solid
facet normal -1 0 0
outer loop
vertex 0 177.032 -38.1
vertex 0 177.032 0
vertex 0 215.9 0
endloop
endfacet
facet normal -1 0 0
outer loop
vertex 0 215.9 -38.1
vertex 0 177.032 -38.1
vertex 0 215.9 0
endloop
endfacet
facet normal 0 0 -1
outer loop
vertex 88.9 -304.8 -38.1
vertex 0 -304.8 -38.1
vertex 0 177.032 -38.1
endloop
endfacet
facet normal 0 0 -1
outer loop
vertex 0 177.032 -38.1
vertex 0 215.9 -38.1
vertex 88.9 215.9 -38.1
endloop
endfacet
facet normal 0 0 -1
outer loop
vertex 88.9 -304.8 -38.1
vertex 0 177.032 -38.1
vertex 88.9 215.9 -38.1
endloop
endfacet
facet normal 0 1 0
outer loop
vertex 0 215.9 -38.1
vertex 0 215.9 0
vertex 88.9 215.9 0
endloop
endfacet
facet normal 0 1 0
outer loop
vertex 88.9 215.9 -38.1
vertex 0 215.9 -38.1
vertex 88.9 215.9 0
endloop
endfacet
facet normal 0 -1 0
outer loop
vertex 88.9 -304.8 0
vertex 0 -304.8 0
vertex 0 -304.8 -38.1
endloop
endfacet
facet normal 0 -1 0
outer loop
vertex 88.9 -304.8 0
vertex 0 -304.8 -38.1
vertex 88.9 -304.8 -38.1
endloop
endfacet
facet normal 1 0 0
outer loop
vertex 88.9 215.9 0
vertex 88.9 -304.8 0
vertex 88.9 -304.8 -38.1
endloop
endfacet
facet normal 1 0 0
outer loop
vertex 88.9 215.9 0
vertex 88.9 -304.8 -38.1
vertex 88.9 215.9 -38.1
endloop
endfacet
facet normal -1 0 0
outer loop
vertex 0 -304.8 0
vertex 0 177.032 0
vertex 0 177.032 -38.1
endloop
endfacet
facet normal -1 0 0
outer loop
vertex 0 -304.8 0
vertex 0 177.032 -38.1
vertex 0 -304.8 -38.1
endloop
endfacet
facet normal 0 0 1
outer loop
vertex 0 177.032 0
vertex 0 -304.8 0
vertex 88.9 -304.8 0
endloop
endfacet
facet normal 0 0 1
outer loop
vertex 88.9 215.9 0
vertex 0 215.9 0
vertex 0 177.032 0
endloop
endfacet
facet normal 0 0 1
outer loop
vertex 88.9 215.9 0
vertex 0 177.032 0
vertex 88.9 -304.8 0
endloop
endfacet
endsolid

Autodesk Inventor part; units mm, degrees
ref_plane "YZ Plane" through (0, 0, 0) normal (1, 0, 0) x (0, 1, 0)
ref_plane "XZ Plane" through (0, 0, 0) normal (0, 1, 0) x (-1, 0, 0)
ref_plane "XY Plane" through (0, 0, 0) normal (0, 0, 1) x (1, 0, 0)
sketch "Sketch1" plane through (0, 0, 0) normal (0, 0, 1) x (1, 0, 0)
  line L0 (0, 215.9) -> (590.55, 215.9) projected
  line L1 (0, 177.0325) -> (0, 215.9) projected
  line L2 (-590.55, -304.8) -> (628.65, -304.8) projected
  line L3 (0, 215.9) -> (0, -304.8)
  line L4 (88.9, -304.8) -> (88.9, 215.9)
  point P0 (0, 0)
  dimension "d0" = 88.9
extrude "Extrusion1" add sketch "Sketch1" against normal blind 38.1
properties part number "2x4x20.5"
